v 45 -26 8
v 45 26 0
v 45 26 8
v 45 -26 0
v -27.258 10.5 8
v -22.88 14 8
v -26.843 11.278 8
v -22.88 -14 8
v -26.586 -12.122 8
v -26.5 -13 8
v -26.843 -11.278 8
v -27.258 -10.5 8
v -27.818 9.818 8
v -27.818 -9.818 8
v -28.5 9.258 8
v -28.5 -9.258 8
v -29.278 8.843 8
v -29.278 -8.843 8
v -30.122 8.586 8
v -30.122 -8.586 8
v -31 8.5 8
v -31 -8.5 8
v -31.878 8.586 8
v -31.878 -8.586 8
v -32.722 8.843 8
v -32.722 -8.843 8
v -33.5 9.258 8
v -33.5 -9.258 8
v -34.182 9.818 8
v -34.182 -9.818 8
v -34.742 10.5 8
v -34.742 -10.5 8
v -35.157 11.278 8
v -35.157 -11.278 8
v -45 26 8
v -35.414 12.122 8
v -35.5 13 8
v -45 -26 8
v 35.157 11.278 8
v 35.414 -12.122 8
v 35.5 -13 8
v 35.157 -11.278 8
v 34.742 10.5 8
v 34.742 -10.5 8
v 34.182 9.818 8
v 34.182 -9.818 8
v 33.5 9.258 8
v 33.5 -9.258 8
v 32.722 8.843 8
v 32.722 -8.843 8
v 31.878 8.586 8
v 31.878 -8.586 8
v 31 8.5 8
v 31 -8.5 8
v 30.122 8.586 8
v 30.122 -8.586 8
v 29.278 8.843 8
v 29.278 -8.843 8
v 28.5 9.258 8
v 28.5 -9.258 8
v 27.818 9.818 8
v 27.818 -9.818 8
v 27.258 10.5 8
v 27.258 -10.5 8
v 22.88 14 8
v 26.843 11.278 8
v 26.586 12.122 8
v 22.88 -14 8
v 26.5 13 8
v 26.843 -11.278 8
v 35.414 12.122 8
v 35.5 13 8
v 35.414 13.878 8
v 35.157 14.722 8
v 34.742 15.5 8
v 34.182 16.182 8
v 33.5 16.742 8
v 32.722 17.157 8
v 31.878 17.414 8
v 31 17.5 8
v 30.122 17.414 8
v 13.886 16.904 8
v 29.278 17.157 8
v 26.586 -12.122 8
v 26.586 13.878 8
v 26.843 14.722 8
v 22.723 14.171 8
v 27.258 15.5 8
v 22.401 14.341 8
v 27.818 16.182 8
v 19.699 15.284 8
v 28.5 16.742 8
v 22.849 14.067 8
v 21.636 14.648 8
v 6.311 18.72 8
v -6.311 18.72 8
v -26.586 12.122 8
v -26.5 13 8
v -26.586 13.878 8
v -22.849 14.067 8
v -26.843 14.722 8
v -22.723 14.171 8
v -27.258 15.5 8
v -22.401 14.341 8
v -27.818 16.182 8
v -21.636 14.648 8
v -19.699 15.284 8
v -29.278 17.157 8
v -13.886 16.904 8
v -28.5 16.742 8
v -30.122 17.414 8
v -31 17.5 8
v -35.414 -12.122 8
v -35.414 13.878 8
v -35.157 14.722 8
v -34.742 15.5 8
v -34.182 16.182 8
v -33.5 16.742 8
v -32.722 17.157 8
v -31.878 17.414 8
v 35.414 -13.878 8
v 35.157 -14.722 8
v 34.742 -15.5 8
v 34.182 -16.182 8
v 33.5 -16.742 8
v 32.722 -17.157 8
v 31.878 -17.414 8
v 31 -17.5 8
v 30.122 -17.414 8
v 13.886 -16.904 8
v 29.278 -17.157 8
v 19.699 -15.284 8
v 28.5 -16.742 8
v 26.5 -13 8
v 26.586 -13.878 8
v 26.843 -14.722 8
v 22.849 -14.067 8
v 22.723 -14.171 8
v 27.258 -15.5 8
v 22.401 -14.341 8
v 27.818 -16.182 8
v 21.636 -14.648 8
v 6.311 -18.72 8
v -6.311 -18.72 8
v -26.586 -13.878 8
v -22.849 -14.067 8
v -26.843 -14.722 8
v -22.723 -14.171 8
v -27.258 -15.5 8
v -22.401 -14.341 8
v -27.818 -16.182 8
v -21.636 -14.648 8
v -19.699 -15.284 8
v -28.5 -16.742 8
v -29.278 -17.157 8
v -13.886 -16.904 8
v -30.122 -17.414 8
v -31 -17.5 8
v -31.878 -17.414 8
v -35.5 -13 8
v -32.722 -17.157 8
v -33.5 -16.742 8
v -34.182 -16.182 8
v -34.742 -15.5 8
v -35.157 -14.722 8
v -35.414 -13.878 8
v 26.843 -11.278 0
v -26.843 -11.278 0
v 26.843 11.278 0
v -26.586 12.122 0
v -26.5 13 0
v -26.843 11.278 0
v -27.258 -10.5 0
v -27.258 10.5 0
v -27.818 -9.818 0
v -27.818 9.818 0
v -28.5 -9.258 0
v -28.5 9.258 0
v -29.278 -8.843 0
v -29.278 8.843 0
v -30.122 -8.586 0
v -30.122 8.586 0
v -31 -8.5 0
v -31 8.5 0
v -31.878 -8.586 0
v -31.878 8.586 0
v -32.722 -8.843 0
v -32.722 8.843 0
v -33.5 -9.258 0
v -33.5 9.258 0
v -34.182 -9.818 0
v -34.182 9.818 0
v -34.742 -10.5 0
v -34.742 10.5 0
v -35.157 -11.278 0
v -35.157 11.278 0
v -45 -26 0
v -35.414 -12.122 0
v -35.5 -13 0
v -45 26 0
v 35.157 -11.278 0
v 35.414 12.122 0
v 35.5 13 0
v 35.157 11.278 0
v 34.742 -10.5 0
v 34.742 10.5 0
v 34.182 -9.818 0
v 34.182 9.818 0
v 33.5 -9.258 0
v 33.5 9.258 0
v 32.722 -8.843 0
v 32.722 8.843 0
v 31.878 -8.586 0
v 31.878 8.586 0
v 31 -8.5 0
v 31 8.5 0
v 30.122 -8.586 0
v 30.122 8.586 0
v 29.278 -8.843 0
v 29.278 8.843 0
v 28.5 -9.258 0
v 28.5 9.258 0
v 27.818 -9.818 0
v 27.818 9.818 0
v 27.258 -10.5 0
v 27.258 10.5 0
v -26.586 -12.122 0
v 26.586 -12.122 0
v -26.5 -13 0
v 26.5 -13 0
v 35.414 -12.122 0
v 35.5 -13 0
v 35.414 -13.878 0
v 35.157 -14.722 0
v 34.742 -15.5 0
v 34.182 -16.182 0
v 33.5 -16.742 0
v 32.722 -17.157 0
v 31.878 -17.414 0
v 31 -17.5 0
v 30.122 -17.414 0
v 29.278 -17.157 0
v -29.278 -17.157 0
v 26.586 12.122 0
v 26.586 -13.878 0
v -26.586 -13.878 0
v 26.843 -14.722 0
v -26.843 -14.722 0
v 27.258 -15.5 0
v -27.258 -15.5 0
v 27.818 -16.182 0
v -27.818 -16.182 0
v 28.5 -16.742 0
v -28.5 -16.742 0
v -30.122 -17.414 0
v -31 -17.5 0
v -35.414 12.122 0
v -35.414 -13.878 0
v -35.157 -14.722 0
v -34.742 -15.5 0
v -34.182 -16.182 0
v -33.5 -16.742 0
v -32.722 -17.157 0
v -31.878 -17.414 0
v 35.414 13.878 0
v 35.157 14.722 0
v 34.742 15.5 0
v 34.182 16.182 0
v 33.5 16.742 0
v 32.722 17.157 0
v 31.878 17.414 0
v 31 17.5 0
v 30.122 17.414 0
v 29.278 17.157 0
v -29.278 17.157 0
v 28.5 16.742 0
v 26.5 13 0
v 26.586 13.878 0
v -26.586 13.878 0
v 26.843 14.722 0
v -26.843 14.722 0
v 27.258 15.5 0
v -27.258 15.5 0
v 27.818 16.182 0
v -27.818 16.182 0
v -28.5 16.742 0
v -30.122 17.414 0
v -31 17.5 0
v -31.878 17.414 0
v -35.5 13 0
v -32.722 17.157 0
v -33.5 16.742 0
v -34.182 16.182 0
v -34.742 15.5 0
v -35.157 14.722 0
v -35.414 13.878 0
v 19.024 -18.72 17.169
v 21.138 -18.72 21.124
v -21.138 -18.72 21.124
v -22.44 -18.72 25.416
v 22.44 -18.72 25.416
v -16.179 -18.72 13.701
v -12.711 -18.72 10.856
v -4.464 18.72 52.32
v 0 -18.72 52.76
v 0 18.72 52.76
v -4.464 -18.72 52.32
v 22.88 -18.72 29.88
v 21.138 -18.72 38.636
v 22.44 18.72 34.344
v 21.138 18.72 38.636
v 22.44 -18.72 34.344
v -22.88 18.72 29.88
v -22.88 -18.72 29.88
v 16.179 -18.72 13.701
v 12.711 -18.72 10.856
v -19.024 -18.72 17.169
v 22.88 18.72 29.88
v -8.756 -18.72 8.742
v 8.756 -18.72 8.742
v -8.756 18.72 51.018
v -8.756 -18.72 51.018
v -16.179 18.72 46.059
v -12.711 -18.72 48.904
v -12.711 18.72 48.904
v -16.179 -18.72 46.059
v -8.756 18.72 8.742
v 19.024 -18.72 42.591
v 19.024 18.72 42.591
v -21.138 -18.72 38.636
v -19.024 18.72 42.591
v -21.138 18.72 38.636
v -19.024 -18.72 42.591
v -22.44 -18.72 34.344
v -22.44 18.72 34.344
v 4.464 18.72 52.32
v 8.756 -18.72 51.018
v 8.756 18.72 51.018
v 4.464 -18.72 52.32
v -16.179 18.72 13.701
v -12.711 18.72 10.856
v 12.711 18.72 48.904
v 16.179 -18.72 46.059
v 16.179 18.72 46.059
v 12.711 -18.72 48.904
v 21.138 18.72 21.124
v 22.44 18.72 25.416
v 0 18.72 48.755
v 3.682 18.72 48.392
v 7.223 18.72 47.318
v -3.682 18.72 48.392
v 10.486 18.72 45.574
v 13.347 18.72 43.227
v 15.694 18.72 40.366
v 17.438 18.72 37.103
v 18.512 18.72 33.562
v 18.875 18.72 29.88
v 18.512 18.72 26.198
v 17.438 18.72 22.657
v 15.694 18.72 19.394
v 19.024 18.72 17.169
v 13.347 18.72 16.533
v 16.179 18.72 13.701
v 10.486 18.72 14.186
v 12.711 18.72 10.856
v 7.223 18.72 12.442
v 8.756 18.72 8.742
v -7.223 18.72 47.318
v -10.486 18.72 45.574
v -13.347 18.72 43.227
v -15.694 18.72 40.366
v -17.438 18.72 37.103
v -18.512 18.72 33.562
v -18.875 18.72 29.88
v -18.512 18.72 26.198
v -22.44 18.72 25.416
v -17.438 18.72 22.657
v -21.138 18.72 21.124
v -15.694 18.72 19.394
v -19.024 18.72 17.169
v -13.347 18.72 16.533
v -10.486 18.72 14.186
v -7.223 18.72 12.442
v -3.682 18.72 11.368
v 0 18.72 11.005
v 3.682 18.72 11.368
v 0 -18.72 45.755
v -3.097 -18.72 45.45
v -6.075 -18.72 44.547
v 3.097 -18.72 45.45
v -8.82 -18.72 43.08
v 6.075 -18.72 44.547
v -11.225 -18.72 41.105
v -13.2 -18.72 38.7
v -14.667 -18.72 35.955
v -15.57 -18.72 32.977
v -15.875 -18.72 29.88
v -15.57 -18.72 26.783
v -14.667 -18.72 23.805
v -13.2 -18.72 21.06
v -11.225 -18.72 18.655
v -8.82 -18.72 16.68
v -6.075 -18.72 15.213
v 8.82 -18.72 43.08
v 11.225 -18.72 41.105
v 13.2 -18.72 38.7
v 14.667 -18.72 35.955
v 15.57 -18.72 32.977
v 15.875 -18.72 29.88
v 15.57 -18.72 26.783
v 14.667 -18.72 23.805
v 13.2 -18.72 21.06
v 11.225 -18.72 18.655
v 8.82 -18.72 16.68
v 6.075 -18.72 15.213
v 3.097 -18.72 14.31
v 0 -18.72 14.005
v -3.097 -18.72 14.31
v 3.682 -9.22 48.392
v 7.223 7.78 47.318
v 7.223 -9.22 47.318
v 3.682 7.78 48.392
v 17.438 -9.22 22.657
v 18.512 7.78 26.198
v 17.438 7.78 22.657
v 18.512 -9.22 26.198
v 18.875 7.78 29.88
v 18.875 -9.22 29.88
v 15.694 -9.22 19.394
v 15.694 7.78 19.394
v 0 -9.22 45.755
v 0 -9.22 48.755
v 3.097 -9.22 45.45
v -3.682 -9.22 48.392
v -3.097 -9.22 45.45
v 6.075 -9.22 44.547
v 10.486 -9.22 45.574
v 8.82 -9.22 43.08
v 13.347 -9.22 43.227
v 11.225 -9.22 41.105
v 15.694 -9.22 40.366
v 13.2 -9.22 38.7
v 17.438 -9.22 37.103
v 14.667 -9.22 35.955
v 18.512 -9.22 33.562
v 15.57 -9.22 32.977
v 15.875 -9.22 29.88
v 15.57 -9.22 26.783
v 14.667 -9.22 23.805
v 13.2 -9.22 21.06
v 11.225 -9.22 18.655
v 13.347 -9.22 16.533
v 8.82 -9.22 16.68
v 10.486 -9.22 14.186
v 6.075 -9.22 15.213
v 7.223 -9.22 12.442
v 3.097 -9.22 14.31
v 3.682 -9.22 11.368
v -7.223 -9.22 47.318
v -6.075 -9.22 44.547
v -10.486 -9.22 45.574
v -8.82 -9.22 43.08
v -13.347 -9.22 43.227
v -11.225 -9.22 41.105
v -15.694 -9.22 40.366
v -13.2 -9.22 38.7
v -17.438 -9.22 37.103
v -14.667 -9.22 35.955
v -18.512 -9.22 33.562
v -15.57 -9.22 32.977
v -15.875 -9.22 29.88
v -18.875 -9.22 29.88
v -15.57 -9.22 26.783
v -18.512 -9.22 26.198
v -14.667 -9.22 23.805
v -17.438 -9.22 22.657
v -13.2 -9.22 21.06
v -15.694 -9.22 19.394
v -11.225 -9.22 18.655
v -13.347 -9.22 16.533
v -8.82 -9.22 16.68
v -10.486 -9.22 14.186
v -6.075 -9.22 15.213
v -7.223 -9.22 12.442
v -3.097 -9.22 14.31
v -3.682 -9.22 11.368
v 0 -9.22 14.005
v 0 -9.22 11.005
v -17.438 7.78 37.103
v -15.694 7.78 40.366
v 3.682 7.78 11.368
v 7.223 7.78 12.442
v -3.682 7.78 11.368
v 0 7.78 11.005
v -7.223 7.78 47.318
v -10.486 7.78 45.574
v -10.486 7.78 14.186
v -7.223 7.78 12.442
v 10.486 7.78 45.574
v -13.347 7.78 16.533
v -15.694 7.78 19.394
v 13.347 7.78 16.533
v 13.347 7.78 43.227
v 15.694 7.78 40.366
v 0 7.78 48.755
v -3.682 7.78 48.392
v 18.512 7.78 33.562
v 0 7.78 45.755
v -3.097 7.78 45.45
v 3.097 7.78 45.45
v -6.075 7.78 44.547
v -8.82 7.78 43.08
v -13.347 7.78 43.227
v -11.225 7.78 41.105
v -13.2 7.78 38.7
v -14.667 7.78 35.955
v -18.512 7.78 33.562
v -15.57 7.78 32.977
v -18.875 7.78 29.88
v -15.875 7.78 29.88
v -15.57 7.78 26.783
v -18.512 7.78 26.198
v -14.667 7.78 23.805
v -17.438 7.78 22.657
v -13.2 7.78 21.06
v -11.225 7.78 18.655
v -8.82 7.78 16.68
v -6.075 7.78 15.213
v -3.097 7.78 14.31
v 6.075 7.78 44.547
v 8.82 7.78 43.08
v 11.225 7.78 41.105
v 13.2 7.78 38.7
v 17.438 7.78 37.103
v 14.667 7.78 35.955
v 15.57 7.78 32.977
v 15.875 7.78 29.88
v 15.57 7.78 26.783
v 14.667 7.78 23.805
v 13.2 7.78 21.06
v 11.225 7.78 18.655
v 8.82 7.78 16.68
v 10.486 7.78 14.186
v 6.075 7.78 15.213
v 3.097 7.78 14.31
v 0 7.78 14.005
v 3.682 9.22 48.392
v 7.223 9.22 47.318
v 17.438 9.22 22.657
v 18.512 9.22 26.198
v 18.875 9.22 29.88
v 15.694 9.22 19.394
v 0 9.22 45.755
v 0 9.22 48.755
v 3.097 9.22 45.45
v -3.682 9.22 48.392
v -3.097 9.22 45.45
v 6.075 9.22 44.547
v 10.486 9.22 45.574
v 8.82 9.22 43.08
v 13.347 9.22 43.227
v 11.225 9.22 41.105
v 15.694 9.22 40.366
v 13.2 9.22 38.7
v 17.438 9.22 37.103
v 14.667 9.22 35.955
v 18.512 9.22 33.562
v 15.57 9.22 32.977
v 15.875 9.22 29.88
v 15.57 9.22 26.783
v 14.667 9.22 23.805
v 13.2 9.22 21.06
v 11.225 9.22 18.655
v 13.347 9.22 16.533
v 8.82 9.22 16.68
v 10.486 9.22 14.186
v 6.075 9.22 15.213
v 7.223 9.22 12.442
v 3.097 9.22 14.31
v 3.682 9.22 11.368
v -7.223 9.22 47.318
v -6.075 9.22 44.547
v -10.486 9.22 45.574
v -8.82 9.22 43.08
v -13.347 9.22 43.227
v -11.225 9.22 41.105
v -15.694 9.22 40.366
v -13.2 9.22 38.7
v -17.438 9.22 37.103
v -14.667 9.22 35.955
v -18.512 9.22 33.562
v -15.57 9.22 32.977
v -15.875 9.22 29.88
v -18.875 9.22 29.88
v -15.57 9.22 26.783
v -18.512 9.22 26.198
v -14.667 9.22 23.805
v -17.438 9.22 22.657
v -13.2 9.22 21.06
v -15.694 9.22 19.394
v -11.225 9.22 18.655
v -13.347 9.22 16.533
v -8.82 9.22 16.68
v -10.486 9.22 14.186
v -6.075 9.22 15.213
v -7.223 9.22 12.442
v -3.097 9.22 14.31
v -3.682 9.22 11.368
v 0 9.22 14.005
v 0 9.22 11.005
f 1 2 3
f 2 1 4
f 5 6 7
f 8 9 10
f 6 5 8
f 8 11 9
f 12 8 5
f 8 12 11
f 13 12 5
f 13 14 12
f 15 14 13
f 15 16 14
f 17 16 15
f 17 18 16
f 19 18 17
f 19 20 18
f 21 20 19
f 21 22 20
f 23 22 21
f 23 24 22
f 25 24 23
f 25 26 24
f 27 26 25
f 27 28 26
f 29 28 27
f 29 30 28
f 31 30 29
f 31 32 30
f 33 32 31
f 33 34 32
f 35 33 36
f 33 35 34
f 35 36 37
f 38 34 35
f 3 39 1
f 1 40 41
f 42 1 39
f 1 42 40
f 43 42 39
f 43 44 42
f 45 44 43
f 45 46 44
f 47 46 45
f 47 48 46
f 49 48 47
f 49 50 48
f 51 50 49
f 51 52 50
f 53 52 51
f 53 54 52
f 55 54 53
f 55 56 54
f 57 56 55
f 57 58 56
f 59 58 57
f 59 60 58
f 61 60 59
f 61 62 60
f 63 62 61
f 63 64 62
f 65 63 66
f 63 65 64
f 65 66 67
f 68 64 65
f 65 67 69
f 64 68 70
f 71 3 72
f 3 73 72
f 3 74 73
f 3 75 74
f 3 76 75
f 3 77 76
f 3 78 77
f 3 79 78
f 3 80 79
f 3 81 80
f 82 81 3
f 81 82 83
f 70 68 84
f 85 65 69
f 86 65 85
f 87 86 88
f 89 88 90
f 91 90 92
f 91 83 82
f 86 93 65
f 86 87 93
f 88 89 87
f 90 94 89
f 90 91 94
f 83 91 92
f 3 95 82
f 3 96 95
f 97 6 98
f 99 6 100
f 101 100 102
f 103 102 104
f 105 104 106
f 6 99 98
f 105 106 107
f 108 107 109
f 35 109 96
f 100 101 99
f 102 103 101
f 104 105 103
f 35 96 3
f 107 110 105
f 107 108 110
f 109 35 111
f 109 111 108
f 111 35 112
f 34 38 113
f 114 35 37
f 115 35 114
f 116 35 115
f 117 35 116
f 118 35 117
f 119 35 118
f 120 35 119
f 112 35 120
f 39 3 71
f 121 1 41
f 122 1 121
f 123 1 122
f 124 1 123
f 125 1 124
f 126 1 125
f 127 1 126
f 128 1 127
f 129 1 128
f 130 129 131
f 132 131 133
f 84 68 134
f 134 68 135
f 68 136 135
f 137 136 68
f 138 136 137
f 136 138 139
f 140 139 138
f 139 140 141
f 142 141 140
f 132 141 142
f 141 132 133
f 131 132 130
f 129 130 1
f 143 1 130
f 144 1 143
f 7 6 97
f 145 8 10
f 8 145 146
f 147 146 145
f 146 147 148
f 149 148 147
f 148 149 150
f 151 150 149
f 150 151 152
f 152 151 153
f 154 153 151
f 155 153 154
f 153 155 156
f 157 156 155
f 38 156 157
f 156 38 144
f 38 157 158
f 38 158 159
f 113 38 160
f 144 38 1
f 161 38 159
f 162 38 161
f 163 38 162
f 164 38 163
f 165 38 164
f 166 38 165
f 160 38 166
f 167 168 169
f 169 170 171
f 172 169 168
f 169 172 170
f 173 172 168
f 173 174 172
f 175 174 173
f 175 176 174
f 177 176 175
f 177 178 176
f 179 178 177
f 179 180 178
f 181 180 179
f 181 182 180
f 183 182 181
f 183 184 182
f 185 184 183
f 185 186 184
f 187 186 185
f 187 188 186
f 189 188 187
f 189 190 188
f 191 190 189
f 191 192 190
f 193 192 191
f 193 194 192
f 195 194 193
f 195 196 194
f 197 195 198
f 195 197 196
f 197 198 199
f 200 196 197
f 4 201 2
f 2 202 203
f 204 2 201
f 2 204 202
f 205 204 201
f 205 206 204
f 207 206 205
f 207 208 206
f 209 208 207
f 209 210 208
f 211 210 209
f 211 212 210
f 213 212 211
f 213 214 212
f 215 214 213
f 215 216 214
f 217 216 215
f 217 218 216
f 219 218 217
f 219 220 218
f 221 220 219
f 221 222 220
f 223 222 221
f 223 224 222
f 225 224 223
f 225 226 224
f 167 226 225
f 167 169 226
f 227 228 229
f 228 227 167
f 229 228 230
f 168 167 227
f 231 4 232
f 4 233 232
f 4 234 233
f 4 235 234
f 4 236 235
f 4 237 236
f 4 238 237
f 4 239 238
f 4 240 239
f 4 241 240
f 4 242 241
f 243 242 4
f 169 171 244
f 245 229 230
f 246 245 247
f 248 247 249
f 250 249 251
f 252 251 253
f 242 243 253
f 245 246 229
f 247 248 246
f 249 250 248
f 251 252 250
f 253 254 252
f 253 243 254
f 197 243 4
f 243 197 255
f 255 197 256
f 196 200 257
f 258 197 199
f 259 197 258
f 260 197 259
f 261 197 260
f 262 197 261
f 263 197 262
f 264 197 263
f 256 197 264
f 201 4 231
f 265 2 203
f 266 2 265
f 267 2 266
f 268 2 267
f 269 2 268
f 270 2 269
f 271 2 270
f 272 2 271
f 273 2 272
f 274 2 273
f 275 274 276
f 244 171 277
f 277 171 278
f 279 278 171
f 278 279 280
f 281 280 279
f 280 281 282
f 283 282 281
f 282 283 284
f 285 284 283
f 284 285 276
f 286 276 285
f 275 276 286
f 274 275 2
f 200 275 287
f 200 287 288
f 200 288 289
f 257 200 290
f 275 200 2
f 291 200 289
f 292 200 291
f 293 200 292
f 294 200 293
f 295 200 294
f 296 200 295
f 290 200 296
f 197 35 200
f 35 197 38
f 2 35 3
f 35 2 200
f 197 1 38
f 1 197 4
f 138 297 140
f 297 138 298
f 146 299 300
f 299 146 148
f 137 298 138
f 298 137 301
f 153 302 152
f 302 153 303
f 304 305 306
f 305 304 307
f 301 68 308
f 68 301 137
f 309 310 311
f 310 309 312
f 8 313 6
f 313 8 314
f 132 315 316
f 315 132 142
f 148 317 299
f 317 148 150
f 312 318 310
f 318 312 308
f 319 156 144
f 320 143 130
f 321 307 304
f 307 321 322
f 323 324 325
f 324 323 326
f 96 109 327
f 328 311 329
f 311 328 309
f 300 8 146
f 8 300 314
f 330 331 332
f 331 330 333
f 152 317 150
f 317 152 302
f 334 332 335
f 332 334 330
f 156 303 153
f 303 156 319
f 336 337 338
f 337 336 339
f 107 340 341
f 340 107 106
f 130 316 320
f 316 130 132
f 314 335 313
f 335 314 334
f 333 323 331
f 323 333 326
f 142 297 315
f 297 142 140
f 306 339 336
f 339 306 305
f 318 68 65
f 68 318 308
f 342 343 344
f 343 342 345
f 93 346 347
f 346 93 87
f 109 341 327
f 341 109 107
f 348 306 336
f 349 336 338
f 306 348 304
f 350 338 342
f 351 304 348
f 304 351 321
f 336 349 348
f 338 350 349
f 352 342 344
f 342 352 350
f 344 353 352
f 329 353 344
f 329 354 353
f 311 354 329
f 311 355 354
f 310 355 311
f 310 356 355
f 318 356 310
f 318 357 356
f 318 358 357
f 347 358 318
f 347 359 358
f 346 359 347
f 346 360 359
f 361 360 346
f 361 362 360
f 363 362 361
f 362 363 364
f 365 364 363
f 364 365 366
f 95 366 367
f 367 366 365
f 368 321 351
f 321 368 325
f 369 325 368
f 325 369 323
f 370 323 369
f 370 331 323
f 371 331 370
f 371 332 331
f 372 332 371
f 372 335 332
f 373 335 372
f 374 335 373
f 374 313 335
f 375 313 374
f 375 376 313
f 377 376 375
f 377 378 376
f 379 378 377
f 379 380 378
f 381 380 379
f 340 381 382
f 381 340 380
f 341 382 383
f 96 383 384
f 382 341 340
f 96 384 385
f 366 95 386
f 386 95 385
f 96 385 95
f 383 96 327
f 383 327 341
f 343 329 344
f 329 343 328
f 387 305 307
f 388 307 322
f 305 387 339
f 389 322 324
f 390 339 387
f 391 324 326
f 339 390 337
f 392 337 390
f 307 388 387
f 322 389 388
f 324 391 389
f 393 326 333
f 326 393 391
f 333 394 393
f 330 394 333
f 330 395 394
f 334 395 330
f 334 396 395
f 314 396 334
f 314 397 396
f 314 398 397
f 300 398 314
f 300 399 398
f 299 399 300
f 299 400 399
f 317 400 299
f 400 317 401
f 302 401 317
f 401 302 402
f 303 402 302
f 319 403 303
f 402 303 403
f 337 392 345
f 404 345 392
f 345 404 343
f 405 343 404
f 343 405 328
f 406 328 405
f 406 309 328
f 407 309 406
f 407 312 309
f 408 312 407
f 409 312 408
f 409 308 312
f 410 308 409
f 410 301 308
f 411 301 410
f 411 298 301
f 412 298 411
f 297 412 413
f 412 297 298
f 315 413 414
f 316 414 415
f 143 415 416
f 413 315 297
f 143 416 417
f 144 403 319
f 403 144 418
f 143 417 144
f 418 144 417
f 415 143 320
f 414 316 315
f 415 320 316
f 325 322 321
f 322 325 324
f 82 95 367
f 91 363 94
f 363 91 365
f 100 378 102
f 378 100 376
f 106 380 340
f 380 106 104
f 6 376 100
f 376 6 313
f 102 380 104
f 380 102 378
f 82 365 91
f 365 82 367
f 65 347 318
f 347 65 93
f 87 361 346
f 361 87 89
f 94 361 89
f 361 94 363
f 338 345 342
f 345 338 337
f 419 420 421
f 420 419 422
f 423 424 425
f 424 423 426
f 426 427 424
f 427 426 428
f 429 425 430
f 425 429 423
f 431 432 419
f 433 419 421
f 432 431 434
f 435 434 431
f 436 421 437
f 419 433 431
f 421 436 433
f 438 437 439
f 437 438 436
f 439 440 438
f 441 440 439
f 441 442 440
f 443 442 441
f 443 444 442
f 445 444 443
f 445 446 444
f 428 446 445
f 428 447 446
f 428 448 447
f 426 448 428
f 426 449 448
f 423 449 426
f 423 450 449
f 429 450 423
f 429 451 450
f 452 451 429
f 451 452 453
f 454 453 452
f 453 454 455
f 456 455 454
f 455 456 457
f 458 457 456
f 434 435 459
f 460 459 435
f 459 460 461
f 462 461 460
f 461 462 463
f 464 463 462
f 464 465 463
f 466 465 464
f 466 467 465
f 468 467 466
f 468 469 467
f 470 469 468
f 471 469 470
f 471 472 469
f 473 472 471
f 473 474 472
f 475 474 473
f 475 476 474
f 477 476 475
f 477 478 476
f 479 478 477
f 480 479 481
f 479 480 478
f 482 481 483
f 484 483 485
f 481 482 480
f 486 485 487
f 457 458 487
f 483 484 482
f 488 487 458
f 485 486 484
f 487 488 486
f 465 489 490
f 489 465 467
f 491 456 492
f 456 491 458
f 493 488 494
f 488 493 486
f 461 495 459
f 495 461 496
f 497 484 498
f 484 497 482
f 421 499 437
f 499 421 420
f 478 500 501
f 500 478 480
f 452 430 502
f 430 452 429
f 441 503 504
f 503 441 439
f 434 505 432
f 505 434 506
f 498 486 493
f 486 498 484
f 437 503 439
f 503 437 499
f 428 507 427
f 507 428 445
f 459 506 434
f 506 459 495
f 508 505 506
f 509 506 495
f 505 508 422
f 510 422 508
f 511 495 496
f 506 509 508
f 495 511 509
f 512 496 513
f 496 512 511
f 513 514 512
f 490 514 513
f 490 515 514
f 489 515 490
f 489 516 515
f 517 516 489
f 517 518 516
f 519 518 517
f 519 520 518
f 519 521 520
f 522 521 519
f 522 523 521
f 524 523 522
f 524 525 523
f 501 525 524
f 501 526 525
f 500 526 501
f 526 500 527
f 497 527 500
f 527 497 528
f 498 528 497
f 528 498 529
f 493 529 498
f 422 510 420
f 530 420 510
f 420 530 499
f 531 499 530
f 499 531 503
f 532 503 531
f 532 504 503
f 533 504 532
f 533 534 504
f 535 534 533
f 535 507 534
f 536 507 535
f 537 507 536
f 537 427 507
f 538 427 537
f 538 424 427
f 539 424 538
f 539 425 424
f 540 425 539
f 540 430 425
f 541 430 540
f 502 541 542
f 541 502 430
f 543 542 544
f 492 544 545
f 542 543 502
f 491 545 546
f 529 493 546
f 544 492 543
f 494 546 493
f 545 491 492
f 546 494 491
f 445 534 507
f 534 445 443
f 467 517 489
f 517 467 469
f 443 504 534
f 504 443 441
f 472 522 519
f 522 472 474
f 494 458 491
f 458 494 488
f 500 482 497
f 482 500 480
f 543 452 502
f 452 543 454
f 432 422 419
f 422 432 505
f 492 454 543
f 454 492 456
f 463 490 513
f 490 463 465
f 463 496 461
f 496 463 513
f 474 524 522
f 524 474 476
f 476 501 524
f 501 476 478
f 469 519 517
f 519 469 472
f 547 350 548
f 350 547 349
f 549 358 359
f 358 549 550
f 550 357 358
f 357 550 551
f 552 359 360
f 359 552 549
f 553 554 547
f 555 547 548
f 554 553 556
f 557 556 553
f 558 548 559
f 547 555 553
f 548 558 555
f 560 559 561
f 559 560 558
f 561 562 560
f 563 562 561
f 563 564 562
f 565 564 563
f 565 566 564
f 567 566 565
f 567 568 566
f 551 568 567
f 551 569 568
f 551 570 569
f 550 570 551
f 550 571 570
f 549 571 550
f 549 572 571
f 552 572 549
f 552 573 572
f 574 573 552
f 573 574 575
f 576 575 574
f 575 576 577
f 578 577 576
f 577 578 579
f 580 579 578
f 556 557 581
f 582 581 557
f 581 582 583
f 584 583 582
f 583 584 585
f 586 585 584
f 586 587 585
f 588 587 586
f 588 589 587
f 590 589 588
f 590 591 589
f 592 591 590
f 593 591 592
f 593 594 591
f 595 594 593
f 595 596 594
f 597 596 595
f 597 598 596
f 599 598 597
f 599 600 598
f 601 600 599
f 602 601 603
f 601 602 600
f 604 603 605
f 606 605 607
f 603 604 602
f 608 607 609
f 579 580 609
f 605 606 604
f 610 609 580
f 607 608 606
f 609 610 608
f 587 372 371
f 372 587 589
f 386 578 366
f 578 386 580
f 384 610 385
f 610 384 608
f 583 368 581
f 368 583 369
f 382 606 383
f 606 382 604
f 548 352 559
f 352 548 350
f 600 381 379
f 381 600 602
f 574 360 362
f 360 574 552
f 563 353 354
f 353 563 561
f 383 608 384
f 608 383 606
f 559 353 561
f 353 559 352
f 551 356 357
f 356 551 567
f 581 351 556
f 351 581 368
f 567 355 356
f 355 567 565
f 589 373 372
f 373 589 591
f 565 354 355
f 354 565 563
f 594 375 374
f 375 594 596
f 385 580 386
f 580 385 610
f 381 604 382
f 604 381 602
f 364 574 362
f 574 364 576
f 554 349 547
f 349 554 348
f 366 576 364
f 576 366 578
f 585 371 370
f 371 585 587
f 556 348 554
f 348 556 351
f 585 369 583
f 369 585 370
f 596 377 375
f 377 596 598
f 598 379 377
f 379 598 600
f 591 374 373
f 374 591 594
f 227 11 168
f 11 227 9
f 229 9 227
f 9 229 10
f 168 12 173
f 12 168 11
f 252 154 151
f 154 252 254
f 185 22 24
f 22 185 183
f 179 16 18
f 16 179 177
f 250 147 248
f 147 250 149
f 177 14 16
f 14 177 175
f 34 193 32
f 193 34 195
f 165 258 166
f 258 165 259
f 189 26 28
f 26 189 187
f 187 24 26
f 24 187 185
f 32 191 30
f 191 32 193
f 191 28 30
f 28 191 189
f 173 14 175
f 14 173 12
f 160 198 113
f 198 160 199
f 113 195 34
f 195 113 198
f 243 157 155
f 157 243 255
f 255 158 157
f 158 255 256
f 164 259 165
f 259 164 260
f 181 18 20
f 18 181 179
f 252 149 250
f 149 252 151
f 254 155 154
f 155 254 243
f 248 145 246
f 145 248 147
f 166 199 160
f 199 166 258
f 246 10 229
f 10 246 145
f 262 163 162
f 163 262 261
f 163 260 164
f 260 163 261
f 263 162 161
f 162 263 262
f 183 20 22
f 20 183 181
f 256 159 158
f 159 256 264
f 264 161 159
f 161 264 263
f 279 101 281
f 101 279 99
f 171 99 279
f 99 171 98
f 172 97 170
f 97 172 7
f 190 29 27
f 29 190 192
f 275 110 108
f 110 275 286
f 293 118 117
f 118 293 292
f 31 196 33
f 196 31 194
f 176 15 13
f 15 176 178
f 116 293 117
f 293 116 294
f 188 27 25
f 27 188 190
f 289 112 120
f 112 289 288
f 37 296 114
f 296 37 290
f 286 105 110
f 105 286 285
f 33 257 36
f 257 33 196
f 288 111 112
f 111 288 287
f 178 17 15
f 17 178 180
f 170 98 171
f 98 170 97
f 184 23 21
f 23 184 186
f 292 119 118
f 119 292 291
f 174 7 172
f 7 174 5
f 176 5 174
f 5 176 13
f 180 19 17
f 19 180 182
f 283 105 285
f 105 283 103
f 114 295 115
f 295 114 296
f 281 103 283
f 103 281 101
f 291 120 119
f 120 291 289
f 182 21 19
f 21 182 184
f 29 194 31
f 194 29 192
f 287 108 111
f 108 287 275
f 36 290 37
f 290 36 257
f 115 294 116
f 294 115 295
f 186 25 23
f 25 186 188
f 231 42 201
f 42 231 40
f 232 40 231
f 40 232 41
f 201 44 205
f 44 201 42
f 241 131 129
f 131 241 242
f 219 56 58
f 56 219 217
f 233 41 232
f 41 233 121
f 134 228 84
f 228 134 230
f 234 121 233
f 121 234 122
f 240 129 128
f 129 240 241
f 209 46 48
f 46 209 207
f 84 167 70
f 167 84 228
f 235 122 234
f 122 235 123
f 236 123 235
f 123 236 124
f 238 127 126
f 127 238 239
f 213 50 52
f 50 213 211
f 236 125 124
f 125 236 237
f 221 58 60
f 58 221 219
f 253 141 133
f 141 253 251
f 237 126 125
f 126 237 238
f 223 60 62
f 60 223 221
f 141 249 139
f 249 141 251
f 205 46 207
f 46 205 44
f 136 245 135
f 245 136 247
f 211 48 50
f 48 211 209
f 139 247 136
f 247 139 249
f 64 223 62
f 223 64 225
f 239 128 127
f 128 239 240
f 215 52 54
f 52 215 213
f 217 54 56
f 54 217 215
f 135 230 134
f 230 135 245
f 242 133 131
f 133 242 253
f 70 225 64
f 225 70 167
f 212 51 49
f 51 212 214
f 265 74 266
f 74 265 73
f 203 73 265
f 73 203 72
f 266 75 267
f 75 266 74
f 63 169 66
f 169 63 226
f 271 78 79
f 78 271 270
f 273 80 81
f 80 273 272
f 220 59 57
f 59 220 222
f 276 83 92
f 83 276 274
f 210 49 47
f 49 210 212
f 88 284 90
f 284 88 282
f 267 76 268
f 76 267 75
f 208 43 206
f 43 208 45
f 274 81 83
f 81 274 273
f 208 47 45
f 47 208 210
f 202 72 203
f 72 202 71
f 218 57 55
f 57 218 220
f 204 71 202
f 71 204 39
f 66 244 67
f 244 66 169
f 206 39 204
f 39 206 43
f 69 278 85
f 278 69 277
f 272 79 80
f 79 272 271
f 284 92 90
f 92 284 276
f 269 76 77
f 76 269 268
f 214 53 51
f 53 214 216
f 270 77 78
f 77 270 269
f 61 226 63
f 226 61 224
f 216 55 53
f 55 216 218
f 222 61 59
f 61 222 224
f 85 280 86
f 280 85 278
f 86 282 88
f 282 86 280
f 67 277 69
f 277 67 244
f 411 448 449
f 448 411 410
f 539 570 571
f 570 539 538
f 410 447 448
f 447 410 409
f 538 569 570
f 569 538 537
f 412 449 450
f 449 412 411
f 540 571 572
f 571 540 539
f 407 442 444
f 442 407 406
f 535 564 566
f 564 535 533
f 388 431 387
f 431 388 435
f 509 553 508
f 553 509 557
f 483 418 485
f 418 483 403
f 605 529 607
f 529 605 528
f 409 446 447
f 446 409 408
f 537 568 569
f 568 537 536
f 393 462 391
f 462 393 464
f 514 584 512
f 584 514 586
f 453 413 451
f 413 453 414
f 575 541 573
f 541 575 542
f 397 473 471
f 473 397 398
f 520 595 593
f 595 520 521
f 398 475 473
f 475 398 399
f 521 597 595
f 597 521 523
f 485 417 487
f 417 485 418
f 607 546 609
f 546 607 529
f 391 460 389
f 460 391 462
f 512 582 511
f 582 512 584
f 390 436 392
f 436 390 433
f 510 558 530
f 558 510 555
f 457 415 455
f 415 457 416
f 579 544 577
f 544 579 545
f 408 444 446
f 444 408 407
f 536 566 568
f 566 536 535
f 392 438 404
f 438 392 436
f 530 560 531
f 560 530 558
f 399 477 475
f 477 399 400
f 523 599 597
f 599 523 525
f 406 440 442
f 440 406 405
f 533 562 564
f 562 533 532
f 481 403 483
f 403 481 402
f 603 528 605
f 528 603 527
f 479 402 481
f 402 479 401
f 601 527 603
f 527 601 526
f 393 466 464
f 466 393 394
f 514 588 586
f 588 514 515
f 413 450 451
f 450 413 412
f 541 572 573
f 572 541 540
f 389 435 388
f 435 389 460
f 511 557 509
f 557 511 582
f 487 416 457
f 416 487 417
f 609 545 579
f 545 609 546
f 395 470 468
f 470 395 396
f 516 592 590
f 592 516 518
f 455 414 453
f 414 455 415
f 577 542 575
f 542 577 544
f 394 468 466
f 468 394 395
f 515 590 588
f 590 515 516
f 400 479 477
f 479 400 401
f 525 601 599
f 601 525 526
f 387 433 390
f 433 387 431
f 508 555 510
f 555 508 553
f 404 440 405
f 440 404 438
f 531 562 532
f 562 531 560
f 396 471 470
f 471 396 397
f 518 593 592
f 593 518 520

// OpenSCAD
$fn = 32;

// ----------------------------------------------------------------------
// Bearing block: 90 x 52 mm base, 31.75 mm bore at 29.88 mm
// ----------------------------------------------------------------------

// --- parameters (mm) ---
base_w = 90;              // base width
base_d = 52;              // base depth
base_t = 8;               // base thickness
bore_d = 31.75;           // shaft / bearing bore
house_r = 22.88;          // housing outer radius
house_len = 37.44;        // housing length along the shaft
foot_w = 45.76;           // foot width under the housing
foot_len = 27.44;         // foot length along the shaft
axis_z = 29.88;           // bore axis height above the base
holes_d = 9;              // mounting holes
hole_x = 31;              // mounting hole spacing
seat_d = 12;              // bearing seat depth
seat_wall = 3;            // seat wall thickness

difference() {
  union() {
    /* base plate with its underside on z = 0 */
    translate([0, 0, base_t / 2]) cube([base_w, base_d, base_t], center = true);
    /* hull foot: a straight web blending into the round housing */
    hull() {
      translate([0, 0, base_t - 0.5]) cube([foot_w, foot_len, 1.6], center = true);
      translate([0, 0, axis_z]) rotate([-90, 0, 0]) cylinder(h = house_len, d = 2 * house_r, center = true);
    }
  }
  /* bore through the housing, 2.5 mm clear on both sides */
  translate([0, 0, axis_z]) rotate([-90, 0, 0]) cylinder(h = house_len + 5, d = bore_d, center = true);
  /* bearing seats, recessed into both ends of the housing */
  for (sy = [-1, 1]) {
    translate([0, sy * (house_len / 2 - seat_d + 2.5), axis_z]) rotate([-90, 0, 0]) cylinder(h = seat_d + 5, d = bore_d + 2 * seat_wall);
  }
  /* mounting holes through the base plate */
  for (hx = [-31, 31]) {
    for (hy = [-13, 13]) {
      translate([hx, hy, -2.5]) cylinder(h = base_t + 5, d = holes_d);
    }
  }
}
